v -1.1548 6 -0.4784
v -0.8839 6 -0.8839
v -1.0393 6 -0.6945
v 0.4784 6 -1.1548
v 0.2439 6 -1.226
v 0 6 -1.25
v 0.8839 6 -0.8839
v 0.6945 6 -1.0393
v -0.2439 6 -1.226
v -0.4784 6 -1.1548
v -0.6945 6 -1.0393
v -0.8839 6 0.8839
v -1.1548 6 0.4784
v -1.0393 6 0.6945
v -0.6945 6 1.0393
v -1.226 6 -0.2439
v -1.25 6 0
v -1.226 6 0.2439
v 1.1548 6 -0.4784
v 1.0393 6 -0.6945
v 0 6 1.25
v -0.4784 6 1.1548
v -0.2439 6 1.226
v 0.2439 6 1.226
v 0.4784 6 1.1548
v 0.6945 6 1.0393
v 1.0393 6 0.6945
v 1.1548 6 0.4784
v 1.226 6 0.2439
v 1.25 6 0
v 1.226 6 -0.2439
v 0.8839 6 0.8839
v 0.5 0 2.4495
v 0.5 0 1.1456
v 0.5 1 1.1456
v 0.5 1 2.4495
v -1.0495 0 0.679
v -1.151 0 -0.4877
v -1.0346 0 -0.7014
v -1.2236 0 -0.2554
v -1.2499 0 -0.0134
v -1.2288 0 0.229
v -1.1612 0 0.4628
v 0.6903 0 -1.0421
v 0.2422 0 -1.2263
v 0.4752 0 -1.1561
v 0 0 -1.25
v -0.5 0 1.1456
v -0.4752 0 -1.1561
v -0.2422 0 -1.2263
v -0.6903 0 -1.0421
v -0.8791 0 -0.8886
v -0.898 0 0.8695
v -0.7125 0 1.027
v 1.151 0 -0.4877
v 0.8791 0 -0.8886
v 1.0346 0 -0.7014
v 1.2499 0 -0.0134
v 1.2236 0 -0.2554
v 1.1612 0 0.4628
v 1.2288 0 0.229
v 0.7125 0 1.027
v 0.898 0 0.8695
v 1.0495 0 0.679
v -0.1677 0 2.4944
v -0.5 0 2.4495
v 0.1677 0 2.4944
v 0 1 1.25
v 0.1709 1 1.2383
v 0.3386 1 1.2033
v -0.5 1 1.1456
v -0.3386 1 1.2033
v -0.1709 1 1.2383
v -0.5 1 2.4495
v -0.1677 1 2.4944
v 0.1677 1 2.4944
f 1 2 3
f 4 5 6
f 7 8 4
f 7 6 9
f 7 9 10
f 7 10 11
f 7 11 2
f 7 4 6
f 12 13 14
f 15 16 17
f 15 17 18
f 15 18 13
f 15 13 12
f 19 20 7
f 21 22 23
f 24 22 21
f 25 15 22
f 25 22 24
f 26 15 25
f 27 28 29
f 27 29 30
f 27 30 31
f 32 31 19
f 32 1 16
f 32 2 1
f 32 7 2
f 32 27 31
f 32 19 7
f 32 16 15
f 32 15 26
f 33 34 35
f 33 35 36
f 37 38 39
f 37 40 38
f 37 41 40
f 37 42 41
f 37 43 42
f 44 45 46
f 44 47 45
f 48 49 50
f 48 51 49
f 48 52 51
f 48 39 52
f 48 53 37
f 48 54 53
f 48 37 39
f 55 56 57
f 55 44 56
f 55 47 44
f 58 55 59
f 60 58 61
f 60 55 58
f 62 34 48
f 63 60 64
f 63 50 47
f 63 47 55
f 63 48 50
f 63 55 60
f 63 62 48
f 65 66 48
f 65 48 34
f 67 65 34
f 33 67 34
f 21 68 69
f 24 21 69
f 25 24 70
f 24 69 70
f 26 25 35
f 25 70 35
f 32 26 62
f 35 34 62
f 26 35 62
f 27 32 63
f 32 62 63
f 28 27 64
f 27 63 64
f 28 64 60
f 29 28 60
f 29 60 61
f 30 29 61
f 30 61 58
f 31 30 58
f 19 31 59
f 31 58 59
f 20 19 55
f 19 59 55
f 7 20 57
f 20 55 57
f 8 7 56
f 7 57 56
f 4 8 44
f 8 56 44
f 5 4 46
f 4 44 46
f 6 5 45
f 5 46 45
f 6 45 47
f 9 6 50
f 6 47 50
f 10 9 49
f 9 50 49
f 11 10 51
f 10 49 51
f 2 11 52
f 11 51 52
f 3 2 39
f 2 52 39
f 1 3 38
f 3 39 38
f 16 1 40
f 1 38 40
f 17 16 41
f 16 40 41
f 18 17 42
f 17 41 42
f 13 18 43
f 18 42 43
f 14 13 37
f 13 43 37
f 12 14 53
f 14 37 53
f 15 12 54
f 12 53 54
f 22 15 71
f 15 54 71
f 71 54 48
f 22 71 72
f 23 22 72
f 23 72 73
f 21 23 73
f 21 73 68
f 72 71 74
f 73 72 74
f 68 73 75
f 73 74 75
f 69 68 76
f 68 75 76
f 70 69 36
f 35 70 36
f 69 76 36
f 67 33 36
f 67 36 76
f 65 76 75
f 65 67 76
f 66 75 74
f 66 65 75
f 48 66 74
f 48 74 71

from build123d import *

# Parameters (mm, degrees)
SKETCH1_R           = 1.25
BOSS_EXTRUDE1_DEPTH = 6
BOSS_EXTRUDE3_DEPTH = 1


with BuildPart() as part:
    # Sketch1 → Boss-Extrude1 (new body)
    with BuildSketch(Plane(origin=(0, 0, 0), x_dir=(1, 0, 0), z_dir=(0, 1, 0))):
        with Locations(Location((0, 0, 0), (0, 0, 270))):
            Circle(SKETCH1_R)
    extrude(amount=BOSS_EXTRUDE1_DEPTH)

    # Sketch3 → Boss-Extrude3 (add)
    with BuildSketch(Plane.XZ):
        with BuildLine():
            Line((-0.5, 2.449489743), (-0.5, 1.145643924))
            ThreePointArc((-0.5, 1.145643924), (0, 1.25), (0.5, 1.145643924))
            Line((0.5, 1.145643924), (0.5, 2.449489743))
            ThreePointArc((0.5, 2.449489743), (0, 2.5), (-0.5, 2.449489743))
        make_face()
    extrude(amount=-BOSS_EXTRUDE3_DEPTH)


solid = part.part
